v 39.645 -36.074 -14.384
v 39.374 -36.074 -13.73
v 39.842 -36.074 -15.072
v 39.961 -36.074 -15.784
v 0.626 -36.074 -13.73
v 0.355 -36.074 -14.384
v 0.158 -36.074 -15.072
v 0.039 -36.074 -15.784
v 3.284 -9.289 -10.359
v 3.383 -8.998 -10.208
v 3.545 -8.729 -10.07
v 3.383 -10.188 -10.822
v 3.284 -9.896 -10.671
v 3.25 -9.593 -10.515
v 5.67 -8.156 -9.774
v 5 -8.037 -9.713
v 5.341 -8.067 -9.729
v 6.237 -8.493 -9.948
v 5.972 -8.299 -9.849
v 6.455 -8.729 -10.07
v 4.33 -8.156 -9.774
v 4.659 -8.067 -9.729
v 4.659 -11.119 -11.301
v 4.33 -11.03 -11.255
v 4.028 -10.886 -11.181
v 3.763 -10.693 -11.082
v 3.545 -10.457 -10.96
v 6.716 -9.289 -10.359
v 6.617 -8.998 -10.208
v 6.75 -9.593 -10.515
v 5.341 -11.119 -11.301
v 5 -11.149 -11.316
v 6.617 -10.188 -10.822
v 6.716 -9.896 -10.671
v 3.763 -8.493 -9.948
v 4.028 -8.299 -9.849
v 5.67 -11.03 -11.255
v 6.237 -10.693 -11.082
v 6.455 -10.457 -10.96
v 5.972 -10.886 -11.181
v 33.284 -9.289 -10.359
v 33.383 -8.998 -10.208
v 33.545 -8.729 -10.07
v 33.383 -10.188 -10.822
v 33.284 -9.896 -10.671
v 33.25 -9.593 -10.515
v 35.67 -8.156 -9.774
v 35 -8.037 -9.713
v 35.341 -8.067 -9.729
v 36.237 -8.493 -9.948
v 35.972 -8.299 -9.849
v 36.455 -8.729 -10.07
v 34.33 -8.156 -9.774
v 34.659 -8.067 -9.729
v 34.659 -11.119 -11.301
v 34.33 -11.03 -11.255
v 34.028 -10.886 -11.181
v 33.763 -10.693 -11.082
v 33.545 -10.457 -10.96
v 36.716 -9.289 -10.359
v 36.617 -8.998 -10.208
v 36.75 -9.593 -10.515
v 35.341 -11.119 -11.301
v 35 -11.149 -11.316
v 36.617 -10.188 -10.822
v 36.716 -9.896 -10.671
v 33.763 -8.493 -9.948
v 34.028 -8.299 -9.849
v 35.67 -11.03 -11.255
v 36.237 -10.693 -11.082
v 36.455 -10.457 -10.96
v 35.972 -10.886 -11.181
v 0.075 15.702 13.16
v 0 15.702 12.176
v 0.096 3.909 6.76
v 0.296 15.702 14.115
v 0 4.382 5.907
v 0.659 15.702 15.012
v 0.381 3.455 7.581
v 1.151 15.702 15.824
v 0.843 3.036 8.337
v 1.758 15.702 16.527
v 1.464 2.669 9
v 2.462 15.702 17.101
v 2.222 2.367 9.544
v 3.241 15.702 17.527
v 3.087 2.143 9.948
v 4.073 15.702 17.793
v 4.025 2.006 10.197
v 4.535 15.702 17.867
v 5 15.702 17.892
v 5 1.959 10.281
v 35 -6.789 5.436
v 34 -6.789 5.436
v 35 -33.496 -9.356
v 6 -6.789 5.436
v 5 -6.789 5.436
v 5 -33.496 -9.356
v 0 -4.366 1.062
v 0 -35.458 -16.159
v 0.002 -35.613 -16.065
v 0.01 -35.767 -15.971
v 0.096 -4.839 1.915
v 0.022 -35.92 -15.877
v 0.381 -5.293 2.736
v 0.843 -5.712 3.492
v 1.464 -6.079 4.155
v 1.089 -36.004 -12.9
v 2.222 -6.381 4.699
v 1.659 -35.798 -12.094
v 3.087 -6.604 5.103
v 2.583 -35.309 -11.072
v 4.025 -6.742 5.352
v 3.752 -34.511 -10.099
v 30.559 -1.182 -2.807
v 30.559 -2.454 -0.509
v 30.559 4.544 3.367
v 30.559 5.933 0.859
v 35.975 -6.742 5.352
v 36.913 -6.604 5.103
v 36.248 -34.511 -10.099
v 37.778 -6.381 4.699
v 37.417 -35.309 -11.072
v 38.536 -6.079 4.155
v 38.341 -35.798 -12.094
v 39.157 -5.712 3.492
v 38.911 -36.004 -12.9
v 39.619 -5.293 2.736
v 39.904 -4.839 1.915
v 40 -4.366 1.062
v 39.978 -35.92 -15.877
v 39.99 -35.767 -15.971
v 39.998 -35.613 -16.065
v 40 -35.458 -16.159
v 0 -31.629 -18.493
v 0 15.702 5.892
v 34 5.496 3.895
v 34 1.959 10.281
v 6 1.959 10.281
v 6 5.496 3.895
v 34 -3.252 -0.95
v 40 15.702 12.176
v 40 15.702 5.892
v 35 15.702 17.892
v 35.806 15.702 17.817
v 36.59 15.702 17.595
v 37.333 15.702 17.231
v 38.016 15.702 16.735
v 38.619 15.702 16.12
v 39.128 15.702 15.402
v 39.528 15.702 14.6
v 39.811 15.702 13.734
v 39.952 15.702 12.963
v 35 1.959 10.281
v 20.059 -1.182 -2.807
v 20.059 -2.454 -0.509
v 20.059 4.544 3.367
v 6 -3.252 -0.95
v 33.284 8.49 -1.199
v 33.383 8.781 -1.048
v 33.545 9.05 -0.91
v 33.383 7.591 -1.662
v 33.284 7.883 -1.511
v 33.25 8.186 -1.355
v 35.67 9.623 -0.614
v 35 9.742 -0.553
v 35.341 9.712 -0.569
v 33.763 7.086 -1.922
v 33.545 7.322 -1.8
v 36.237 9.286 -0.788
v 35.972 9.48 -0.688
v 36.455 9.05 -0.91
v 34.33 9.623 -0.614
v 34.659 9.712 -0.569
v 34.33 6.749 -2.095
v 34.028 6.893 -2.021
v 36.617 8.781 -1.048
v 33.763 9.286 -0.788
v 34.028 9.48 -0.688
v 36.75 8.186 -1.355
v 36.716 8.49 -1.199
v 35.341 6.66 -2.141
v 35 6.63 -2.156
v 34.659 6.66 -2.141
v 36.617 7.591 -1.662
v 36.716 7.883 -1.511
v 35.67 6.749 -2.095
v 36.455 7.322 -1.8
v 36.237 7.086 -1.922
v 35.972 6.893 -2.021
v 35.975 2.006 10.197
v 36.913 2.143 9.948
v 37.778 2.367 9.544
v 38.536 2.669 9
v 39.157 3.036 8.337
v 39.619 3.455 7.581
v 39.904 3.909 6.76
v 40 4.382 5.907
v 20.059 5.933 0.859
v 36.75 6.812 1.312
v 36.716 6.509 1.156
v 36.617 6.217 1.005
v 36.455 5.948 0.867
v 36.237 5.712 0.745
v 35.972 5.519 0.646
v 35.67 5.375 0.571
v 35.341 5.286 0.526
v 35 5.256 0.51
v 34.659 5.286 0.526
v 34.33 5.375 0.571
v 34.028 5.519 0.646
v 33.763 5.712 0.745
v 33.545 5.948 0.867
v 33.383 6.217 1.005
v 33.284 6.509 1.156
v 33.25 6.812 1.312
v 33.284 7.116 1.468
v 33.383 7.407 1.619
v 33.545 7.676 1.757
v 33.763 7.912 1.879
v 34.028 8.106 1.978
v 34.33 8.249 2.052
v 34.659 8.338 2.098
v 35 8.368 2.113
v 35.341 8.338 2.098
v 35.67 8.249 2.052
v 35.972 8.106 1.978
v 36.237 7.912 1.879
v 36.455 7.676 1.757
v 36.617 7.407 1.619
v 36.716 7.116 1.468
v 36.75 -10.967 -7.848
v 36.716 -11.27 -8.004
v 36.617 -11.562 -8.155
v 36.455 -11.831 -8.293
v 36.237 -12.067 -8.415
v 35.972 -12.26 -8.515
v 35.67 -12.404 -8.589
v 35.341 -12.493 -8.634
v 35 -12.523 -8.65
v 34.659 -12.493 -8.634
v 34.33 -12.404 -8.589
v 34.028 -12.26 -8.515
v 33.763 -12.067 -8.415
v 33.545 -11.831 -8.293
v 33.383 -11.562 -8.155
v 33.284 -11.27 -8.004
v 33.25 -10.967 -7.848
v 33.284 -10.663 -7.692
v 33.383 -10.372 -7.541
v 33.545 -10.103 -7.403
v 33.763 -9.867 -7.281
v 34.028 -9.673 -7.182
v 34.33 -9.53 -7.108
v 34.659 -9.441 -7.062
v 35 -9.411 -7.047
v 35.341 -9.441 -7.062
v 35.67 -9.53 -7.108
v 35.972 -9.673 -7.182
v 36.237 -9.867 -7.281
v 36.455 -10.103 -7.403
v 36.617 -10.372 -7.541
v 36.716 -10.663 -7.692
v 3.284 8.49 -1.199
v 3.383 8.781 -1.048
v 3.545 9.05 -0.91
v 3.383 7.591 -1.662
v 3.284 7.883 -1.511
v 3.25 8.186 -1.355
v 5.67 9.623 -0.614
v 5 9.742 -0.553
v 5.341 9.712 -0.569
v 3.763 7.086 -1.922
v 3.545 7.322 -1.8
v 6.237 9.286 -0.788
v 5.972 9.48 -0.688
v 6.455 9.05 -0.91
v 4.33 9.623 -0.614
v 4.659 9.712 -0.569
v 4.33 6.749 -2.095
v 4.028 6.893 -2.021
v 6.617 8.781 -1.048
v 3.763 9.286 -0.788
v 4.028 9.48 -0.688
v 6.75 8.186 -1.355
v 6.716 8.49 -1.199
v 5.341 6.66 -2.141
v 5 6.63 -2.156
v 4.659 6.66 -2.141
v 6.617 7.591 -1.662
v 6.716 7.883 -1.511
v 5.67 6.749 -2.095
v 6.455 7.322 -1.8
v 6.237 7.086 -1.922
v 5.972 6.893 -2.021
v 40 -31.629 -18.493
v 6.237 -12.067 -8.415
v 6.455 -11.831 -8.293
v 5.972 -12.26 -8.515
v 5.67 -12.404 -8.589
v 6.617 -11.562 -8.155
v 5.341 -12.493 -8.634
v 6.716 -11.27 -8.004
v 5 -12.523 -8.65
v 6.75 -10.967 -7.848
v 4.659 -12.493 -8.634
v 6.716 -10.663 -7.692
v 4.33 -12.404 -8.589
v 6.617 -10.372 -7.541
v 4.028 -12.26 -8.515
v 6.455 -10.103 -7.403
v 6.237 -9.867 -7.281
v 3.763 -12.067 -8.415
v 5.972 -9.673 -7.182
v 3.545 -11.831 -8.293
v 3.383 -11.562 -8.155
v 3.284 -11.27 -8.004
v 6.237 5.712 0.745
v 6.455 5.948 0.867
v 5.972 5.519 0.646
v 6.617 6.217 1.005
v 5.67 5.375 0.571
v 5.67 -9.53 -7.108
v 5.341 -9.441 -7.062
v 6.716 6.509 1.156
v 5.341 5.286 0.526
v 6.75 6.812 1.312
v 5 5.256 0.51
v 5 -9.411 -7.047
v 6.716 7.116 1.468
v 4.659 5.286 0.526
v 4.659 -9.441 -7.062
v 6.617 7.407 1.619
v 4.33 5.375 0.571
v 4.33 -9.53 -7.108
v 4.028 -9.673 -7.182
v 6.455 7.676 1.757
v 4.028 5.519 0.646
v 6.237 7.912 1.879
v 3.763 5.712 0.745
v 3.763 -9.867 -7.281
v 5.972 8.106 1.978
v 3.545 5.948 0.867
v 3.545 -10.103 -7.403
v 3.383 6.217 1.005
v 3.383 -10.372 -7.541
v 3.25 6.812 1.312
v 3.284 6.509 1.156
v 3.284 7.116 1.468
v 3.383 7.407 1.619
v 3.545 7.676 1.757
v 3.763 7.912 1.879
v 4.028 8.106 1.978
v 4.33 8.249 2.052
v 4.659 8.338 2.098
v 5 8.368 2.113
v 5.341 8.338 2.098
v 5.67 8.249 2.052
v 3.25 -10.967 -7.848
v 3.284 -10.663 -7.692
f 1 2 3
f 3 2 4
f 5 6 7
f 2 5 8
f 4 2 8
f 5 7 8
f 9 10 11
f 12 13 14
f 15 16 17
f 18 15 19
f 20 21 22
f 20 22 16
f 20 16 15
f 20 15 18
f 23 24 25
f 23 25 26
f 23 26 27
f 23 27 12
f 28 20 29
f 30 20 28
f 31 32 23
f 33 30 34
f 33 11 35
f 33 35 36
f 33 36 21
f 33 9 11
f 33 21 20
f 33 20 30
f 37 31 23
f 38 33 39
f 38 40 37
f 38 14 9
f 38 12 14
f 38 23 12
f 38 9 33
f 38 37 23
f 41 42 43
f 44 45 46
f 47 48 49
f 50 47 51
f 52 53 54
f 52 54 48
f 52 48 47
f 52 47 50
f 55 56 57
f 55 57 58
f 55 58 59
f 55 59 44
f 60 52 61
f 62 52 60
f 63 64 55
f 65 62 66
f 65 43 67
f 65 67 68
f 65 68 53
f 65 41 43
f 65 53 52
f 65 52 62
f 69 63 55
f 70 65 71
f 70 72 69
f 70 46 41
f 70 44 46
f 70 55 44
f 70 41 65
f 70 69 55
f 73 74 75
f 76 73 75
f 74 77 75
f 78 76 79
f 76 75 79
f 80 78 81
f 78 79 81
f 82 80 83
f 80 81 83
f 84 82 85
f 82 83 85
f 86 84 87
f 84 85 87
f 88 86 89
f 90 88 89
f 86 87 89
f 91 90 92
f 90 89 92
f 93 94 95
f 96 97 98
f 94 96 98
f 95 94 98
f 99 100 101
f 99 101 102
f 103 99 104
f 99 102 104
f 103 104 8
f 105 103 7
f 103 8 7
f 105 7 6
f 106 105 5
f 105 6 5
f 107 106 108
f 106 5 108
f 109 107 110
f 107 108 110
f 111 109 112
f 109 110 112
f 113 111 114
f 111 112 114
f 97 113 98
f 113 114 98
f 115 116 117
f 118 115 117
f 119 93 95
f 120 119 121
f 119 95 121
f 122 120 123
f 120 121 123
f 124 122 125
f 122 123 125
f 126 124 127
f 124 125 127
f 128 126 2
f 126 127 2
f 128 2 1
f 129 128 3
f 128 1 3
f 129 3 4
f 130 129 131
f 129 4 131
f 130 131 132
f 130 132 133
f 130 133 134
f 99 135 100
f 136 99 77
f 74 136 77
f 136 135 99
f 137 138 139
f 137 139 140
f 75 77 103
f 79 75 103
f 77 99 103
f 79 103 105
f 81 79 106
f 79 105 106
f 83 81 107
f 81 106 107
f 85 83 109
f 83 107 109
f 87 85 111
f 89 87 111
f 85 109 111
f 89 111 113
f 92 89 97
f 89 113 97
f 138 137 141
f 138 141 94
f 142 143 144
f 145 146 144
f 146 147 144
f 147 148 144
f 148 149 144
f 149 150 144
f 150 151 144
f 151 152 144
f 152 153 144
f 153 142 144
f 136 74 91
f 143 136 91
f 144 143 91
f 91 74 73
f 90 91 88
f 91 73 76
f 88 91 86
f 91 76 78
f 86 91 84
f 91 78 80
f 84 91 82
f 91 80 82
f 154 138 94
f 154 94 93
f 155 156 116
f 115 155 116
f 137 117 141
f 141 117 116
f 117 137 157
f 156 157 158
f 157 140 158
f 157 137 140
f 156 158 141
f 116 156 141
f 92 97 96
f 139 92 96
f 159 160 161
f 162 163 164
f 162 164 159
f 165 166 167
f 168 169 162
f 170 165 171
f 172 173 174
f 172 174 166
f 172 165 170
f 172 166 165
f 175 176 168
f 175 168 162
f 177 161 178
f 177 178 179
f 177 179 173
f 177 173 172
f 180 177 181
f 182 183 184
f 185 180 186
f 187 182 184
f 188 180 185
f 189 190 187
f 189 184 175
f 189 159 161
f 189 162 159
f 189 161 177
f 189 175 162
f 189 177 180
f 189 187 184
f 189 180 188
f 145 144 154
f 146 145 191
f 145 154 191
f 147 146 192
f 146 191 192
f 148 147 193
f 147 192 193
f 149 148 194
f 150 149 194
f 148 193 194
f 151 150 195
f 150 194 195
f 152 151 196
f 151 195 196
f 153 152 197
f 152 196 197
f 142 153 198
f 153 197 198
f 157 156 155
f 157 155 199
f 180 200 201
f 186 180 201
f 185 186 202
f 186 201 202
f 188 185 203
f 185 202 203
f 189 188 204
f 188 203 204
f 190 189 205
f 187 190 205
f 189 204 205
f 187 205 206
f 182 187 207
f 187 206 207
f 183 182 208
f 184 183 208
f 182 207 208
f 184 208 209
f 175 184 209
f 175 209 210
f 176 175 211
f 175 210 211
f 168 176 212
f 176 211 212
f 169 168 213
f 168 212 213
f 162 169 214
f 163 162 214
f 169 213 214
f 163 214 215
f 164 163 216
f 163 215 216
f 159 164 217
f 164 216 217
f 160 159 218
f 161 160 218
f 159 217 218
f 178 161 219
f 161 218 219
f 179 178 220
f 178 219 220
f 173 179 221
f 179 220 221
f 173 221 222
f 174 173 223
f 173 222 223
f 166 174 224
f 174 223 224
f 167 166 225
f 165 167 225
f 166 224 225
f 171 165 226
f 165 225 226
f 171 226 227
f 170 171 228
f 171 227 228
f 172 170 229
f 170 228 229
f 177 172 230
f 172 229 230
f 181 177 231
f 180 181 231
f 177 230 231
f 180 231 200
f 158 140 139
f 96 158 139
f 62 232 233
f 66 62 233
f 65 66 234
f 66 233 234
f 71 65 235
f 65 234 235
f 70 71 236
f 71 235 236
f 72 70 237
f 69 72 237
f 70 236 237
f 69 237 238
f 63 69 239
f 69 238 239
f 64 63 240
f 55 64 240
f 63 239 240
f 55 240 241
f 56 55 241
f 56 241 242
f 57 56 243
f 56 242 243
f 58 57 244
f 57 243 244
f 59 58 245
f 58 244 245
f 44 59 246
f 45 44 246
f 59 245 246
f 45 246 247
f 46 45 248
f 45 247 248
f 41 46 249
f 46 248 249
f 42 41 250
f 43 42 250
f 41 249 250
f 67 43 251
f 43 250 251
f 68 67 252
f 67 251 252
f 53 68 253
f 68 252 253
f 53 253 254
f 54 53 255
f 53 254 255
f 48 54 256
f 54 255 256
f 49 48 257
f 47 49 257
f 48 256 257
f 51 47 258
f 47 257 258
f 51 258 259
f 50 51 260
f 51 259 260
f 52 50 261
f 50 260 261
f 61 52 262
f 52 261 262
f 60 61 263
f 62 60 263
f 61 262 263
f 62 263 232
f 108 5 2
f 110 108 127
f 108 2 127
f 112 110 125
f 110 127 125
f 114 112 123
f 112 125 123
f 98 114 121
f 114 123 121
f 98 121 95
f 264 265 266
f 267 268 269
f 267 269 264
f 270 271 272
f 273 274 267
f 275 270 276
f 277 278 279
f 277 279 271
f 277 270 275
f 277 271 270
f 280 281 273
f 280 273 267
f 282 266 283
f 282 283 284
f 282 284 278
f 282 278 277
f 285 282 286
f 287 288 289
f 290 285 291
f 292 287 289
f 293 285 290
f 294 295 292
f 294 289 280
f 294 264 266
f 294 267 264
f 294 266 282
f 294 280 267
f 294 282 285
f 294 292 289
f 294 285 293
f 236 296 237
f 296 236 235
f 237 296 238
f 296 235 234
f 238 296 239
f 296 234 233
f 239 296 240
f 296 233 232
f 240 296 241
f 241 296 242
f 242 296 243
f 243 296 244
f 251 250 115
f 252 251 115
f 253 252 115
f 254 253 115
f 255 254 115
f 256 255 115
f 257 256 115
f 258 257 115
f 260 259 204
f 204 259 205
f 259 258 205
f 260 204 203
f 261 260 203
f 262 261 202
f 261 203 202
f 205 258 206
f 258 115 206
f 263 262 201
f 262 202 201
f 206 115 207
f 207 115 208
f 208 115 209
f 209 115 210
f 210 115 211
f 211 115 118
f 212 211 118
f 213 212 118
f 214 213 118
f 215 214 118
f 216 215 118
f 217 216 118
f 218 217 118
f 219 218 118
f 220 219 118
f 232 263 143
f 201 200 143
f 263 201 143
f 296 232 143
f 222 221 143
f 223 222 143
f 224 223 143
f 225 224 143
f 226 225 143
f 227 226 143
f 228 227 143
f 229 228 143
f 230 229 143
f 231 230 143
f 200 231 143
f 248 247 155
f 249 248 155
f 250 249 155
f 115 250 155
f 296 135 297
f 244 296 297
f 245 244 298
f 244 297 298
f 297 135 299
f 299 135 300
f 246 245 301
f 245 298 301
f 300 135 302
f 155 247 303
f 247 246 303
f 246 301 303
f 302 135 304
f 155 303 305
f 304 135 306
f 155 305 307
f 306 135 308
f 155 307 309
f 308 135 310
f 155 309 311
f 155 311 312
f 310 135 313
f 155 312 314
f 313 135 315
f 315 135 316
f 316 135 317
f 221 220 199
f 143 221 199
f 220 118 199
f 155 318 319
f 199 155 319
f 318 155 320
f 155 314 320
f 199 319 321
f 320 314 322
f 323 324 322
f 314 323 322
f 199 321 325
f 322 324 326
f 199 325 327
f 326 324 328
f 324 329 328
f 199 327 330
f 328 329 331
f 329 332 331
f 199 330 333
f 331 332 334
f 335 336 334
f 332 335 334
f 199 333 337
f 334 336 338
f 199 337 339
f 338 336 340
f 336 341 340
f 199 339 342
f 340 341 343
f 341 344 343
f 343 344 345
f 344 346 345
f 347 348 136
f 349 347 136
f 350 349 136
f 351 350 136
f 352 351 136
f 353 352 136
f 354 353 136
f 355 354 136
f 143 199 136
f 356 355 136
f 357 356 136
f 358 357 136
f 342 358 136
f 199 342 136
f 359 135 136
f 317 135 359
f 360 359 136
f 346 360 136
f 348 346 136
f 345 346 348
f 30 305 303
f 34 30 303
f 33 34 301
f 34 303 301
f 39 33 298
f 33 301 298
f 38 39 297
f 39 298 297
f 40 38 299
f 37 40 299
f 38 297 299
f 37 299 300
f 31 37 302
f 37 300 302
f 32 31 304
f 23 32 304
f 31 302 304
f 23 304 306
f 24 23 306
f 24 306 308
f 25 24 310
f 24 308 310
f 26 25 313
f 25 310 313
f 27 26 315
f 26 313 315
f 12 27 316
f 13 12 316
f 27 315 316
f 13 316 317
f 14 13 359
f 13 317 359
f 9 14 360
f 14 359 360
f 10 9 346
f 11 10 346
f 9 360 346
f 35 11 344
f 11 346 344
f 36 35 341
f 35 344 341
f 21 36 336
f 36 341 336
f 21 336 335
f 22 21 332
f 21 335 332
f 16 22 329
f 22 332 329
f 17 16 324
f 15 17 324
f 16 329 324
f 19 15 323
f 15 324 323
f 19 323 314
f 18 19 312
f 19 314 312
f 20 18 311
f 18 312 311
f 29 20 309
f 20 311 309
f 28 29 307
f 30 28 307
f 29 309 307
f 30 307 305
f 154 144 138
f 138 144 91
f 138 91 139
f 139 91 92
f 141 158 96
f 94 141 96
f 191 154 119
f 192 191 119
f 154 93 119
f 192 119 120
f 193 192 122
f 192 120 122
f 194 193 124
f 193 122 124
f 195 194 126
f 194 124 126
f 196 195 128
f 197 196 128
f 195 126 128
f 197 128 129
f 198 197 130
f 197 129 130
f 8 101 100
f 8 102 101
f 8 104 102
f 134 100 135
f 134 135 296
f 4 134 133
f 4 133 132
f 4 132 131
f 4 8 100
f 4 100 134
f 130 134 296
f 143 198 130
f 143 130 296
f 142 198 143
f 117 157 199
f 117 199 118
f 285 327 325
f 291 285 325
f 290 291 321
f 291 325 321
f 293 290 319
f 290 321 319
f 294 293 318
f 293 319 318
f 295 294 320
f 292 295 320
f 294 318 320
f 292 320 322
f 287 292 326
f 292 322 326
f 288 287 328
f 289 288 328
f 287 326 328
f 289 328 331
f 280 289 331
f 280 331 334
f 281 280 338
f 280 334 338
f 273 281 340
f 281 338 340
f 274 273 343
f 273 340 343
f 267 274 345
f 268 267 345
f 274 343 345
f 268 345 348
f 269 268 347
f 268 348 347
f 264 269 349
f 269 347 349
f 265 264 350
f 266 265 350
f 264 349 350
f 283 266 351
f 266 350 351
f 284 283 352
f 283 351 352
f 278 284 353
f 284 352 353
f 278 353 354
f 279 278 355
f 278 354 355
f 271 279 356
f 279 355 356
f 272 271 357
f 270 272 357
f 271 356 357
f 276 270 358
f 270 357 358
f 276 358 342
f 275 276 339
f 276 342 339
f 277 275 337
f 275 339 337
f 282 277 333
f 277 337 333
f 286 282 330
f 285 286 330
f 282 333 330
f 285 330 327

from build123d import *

# Parameters (mm, degrees)
F1_DEPTH = 40
F2_W     = 6
F2_H     = 7.3
F3_DEPTH = 10
F4_W     = 10.5
F4_H     = 8
F5_DEPTH = 25
F6_R     = 1.75
F7_DEPTH = 3
F8_R     = 5
F9_SIZE  = 5


with BuildPart() as f1:
    # F0 (on Right) → F1 (new body)
    with BuildSketch(Plane.YZ):
        Polygon((15.7016541125, 5.8919606872), (15.7016541125, 17.8919606872), (1.959085995, 10.2806947738), (5.4959338209, 3.8947173658), (-3.2519804366, -0.9502796561), (-6.7888282626, 5.435697752), (-36.0735021532, -10.7835007459), (-36.0735021532, -20.7835007459), align=None)
    extrude(amount=F1_DEPTH)

    # F2 (on face) → F3 (join, through all)
    with BuildSketch(Plane(origin=(0, 5.8565406788, 3.2436214293), x_dir=(1, 0, 0), z_dir=(0, -0.8747914258, -0.4844997022))):
        with Locations((3, 4.3942870579)):
            Rectangle(F2_W, F2_H)
        with Locations((37, 4.3942870579)):
            Rectangle(F2_W, F2_H)
    extrude(amount=F3_DEPTH)

    # F4 (on face) → F5 (cut)
    with BuildSketch(Plane(origin=(0, -0.3606068579, 0.6510959365), x_dir=(1, 0, 0), z_dir=(0, -0.4844997022, 0.8747914258))):
        with Locations((25.3092581406, 1.6064377211)):
            Rectangle(F4_W, F4_H)
    extrude(amount=-F5_DEPTH, mode=Mode.SUBTRACT)

    # F6 (on face) → F7 (join)
    with BuildSketch(Plane(origin=(0, 0.8948185727, -1.7367786325), x_dir=(1, 0, 0), z_dir=(0, 0.4580028747, -0.8889507111))):
        with Locations((35, -6.656531521)):
            Circle(F6_R)
        with Locations((5, -6.656531521)):
            Circle(F6_R)
        with Locations((35, 13.343468479)):
            Circle(F6_R)
        with Locations((5, 13.343468479)):
            Circle(F6_R)
    extrude(amount=F7_DEPTH)

    # F8
    f8_edges = [f1.edges().sort_by_distance(p)[0] for p in [
        (20, -36.073502, -10.783501),
        (40, -10.185924, 3.55423),
        (0, -10.185924, 3.55423),
    ]]
    fillet(f8_edges, radius=F8_R)

    # F9
    f9_edges = [f1.edges().sort_by_distance(p)[0] for p in [
        (20, -36.073502, -20.783501),
    ]]
    chamfer(f9_edges, length=F9_SIZE)


solid = f1.part
